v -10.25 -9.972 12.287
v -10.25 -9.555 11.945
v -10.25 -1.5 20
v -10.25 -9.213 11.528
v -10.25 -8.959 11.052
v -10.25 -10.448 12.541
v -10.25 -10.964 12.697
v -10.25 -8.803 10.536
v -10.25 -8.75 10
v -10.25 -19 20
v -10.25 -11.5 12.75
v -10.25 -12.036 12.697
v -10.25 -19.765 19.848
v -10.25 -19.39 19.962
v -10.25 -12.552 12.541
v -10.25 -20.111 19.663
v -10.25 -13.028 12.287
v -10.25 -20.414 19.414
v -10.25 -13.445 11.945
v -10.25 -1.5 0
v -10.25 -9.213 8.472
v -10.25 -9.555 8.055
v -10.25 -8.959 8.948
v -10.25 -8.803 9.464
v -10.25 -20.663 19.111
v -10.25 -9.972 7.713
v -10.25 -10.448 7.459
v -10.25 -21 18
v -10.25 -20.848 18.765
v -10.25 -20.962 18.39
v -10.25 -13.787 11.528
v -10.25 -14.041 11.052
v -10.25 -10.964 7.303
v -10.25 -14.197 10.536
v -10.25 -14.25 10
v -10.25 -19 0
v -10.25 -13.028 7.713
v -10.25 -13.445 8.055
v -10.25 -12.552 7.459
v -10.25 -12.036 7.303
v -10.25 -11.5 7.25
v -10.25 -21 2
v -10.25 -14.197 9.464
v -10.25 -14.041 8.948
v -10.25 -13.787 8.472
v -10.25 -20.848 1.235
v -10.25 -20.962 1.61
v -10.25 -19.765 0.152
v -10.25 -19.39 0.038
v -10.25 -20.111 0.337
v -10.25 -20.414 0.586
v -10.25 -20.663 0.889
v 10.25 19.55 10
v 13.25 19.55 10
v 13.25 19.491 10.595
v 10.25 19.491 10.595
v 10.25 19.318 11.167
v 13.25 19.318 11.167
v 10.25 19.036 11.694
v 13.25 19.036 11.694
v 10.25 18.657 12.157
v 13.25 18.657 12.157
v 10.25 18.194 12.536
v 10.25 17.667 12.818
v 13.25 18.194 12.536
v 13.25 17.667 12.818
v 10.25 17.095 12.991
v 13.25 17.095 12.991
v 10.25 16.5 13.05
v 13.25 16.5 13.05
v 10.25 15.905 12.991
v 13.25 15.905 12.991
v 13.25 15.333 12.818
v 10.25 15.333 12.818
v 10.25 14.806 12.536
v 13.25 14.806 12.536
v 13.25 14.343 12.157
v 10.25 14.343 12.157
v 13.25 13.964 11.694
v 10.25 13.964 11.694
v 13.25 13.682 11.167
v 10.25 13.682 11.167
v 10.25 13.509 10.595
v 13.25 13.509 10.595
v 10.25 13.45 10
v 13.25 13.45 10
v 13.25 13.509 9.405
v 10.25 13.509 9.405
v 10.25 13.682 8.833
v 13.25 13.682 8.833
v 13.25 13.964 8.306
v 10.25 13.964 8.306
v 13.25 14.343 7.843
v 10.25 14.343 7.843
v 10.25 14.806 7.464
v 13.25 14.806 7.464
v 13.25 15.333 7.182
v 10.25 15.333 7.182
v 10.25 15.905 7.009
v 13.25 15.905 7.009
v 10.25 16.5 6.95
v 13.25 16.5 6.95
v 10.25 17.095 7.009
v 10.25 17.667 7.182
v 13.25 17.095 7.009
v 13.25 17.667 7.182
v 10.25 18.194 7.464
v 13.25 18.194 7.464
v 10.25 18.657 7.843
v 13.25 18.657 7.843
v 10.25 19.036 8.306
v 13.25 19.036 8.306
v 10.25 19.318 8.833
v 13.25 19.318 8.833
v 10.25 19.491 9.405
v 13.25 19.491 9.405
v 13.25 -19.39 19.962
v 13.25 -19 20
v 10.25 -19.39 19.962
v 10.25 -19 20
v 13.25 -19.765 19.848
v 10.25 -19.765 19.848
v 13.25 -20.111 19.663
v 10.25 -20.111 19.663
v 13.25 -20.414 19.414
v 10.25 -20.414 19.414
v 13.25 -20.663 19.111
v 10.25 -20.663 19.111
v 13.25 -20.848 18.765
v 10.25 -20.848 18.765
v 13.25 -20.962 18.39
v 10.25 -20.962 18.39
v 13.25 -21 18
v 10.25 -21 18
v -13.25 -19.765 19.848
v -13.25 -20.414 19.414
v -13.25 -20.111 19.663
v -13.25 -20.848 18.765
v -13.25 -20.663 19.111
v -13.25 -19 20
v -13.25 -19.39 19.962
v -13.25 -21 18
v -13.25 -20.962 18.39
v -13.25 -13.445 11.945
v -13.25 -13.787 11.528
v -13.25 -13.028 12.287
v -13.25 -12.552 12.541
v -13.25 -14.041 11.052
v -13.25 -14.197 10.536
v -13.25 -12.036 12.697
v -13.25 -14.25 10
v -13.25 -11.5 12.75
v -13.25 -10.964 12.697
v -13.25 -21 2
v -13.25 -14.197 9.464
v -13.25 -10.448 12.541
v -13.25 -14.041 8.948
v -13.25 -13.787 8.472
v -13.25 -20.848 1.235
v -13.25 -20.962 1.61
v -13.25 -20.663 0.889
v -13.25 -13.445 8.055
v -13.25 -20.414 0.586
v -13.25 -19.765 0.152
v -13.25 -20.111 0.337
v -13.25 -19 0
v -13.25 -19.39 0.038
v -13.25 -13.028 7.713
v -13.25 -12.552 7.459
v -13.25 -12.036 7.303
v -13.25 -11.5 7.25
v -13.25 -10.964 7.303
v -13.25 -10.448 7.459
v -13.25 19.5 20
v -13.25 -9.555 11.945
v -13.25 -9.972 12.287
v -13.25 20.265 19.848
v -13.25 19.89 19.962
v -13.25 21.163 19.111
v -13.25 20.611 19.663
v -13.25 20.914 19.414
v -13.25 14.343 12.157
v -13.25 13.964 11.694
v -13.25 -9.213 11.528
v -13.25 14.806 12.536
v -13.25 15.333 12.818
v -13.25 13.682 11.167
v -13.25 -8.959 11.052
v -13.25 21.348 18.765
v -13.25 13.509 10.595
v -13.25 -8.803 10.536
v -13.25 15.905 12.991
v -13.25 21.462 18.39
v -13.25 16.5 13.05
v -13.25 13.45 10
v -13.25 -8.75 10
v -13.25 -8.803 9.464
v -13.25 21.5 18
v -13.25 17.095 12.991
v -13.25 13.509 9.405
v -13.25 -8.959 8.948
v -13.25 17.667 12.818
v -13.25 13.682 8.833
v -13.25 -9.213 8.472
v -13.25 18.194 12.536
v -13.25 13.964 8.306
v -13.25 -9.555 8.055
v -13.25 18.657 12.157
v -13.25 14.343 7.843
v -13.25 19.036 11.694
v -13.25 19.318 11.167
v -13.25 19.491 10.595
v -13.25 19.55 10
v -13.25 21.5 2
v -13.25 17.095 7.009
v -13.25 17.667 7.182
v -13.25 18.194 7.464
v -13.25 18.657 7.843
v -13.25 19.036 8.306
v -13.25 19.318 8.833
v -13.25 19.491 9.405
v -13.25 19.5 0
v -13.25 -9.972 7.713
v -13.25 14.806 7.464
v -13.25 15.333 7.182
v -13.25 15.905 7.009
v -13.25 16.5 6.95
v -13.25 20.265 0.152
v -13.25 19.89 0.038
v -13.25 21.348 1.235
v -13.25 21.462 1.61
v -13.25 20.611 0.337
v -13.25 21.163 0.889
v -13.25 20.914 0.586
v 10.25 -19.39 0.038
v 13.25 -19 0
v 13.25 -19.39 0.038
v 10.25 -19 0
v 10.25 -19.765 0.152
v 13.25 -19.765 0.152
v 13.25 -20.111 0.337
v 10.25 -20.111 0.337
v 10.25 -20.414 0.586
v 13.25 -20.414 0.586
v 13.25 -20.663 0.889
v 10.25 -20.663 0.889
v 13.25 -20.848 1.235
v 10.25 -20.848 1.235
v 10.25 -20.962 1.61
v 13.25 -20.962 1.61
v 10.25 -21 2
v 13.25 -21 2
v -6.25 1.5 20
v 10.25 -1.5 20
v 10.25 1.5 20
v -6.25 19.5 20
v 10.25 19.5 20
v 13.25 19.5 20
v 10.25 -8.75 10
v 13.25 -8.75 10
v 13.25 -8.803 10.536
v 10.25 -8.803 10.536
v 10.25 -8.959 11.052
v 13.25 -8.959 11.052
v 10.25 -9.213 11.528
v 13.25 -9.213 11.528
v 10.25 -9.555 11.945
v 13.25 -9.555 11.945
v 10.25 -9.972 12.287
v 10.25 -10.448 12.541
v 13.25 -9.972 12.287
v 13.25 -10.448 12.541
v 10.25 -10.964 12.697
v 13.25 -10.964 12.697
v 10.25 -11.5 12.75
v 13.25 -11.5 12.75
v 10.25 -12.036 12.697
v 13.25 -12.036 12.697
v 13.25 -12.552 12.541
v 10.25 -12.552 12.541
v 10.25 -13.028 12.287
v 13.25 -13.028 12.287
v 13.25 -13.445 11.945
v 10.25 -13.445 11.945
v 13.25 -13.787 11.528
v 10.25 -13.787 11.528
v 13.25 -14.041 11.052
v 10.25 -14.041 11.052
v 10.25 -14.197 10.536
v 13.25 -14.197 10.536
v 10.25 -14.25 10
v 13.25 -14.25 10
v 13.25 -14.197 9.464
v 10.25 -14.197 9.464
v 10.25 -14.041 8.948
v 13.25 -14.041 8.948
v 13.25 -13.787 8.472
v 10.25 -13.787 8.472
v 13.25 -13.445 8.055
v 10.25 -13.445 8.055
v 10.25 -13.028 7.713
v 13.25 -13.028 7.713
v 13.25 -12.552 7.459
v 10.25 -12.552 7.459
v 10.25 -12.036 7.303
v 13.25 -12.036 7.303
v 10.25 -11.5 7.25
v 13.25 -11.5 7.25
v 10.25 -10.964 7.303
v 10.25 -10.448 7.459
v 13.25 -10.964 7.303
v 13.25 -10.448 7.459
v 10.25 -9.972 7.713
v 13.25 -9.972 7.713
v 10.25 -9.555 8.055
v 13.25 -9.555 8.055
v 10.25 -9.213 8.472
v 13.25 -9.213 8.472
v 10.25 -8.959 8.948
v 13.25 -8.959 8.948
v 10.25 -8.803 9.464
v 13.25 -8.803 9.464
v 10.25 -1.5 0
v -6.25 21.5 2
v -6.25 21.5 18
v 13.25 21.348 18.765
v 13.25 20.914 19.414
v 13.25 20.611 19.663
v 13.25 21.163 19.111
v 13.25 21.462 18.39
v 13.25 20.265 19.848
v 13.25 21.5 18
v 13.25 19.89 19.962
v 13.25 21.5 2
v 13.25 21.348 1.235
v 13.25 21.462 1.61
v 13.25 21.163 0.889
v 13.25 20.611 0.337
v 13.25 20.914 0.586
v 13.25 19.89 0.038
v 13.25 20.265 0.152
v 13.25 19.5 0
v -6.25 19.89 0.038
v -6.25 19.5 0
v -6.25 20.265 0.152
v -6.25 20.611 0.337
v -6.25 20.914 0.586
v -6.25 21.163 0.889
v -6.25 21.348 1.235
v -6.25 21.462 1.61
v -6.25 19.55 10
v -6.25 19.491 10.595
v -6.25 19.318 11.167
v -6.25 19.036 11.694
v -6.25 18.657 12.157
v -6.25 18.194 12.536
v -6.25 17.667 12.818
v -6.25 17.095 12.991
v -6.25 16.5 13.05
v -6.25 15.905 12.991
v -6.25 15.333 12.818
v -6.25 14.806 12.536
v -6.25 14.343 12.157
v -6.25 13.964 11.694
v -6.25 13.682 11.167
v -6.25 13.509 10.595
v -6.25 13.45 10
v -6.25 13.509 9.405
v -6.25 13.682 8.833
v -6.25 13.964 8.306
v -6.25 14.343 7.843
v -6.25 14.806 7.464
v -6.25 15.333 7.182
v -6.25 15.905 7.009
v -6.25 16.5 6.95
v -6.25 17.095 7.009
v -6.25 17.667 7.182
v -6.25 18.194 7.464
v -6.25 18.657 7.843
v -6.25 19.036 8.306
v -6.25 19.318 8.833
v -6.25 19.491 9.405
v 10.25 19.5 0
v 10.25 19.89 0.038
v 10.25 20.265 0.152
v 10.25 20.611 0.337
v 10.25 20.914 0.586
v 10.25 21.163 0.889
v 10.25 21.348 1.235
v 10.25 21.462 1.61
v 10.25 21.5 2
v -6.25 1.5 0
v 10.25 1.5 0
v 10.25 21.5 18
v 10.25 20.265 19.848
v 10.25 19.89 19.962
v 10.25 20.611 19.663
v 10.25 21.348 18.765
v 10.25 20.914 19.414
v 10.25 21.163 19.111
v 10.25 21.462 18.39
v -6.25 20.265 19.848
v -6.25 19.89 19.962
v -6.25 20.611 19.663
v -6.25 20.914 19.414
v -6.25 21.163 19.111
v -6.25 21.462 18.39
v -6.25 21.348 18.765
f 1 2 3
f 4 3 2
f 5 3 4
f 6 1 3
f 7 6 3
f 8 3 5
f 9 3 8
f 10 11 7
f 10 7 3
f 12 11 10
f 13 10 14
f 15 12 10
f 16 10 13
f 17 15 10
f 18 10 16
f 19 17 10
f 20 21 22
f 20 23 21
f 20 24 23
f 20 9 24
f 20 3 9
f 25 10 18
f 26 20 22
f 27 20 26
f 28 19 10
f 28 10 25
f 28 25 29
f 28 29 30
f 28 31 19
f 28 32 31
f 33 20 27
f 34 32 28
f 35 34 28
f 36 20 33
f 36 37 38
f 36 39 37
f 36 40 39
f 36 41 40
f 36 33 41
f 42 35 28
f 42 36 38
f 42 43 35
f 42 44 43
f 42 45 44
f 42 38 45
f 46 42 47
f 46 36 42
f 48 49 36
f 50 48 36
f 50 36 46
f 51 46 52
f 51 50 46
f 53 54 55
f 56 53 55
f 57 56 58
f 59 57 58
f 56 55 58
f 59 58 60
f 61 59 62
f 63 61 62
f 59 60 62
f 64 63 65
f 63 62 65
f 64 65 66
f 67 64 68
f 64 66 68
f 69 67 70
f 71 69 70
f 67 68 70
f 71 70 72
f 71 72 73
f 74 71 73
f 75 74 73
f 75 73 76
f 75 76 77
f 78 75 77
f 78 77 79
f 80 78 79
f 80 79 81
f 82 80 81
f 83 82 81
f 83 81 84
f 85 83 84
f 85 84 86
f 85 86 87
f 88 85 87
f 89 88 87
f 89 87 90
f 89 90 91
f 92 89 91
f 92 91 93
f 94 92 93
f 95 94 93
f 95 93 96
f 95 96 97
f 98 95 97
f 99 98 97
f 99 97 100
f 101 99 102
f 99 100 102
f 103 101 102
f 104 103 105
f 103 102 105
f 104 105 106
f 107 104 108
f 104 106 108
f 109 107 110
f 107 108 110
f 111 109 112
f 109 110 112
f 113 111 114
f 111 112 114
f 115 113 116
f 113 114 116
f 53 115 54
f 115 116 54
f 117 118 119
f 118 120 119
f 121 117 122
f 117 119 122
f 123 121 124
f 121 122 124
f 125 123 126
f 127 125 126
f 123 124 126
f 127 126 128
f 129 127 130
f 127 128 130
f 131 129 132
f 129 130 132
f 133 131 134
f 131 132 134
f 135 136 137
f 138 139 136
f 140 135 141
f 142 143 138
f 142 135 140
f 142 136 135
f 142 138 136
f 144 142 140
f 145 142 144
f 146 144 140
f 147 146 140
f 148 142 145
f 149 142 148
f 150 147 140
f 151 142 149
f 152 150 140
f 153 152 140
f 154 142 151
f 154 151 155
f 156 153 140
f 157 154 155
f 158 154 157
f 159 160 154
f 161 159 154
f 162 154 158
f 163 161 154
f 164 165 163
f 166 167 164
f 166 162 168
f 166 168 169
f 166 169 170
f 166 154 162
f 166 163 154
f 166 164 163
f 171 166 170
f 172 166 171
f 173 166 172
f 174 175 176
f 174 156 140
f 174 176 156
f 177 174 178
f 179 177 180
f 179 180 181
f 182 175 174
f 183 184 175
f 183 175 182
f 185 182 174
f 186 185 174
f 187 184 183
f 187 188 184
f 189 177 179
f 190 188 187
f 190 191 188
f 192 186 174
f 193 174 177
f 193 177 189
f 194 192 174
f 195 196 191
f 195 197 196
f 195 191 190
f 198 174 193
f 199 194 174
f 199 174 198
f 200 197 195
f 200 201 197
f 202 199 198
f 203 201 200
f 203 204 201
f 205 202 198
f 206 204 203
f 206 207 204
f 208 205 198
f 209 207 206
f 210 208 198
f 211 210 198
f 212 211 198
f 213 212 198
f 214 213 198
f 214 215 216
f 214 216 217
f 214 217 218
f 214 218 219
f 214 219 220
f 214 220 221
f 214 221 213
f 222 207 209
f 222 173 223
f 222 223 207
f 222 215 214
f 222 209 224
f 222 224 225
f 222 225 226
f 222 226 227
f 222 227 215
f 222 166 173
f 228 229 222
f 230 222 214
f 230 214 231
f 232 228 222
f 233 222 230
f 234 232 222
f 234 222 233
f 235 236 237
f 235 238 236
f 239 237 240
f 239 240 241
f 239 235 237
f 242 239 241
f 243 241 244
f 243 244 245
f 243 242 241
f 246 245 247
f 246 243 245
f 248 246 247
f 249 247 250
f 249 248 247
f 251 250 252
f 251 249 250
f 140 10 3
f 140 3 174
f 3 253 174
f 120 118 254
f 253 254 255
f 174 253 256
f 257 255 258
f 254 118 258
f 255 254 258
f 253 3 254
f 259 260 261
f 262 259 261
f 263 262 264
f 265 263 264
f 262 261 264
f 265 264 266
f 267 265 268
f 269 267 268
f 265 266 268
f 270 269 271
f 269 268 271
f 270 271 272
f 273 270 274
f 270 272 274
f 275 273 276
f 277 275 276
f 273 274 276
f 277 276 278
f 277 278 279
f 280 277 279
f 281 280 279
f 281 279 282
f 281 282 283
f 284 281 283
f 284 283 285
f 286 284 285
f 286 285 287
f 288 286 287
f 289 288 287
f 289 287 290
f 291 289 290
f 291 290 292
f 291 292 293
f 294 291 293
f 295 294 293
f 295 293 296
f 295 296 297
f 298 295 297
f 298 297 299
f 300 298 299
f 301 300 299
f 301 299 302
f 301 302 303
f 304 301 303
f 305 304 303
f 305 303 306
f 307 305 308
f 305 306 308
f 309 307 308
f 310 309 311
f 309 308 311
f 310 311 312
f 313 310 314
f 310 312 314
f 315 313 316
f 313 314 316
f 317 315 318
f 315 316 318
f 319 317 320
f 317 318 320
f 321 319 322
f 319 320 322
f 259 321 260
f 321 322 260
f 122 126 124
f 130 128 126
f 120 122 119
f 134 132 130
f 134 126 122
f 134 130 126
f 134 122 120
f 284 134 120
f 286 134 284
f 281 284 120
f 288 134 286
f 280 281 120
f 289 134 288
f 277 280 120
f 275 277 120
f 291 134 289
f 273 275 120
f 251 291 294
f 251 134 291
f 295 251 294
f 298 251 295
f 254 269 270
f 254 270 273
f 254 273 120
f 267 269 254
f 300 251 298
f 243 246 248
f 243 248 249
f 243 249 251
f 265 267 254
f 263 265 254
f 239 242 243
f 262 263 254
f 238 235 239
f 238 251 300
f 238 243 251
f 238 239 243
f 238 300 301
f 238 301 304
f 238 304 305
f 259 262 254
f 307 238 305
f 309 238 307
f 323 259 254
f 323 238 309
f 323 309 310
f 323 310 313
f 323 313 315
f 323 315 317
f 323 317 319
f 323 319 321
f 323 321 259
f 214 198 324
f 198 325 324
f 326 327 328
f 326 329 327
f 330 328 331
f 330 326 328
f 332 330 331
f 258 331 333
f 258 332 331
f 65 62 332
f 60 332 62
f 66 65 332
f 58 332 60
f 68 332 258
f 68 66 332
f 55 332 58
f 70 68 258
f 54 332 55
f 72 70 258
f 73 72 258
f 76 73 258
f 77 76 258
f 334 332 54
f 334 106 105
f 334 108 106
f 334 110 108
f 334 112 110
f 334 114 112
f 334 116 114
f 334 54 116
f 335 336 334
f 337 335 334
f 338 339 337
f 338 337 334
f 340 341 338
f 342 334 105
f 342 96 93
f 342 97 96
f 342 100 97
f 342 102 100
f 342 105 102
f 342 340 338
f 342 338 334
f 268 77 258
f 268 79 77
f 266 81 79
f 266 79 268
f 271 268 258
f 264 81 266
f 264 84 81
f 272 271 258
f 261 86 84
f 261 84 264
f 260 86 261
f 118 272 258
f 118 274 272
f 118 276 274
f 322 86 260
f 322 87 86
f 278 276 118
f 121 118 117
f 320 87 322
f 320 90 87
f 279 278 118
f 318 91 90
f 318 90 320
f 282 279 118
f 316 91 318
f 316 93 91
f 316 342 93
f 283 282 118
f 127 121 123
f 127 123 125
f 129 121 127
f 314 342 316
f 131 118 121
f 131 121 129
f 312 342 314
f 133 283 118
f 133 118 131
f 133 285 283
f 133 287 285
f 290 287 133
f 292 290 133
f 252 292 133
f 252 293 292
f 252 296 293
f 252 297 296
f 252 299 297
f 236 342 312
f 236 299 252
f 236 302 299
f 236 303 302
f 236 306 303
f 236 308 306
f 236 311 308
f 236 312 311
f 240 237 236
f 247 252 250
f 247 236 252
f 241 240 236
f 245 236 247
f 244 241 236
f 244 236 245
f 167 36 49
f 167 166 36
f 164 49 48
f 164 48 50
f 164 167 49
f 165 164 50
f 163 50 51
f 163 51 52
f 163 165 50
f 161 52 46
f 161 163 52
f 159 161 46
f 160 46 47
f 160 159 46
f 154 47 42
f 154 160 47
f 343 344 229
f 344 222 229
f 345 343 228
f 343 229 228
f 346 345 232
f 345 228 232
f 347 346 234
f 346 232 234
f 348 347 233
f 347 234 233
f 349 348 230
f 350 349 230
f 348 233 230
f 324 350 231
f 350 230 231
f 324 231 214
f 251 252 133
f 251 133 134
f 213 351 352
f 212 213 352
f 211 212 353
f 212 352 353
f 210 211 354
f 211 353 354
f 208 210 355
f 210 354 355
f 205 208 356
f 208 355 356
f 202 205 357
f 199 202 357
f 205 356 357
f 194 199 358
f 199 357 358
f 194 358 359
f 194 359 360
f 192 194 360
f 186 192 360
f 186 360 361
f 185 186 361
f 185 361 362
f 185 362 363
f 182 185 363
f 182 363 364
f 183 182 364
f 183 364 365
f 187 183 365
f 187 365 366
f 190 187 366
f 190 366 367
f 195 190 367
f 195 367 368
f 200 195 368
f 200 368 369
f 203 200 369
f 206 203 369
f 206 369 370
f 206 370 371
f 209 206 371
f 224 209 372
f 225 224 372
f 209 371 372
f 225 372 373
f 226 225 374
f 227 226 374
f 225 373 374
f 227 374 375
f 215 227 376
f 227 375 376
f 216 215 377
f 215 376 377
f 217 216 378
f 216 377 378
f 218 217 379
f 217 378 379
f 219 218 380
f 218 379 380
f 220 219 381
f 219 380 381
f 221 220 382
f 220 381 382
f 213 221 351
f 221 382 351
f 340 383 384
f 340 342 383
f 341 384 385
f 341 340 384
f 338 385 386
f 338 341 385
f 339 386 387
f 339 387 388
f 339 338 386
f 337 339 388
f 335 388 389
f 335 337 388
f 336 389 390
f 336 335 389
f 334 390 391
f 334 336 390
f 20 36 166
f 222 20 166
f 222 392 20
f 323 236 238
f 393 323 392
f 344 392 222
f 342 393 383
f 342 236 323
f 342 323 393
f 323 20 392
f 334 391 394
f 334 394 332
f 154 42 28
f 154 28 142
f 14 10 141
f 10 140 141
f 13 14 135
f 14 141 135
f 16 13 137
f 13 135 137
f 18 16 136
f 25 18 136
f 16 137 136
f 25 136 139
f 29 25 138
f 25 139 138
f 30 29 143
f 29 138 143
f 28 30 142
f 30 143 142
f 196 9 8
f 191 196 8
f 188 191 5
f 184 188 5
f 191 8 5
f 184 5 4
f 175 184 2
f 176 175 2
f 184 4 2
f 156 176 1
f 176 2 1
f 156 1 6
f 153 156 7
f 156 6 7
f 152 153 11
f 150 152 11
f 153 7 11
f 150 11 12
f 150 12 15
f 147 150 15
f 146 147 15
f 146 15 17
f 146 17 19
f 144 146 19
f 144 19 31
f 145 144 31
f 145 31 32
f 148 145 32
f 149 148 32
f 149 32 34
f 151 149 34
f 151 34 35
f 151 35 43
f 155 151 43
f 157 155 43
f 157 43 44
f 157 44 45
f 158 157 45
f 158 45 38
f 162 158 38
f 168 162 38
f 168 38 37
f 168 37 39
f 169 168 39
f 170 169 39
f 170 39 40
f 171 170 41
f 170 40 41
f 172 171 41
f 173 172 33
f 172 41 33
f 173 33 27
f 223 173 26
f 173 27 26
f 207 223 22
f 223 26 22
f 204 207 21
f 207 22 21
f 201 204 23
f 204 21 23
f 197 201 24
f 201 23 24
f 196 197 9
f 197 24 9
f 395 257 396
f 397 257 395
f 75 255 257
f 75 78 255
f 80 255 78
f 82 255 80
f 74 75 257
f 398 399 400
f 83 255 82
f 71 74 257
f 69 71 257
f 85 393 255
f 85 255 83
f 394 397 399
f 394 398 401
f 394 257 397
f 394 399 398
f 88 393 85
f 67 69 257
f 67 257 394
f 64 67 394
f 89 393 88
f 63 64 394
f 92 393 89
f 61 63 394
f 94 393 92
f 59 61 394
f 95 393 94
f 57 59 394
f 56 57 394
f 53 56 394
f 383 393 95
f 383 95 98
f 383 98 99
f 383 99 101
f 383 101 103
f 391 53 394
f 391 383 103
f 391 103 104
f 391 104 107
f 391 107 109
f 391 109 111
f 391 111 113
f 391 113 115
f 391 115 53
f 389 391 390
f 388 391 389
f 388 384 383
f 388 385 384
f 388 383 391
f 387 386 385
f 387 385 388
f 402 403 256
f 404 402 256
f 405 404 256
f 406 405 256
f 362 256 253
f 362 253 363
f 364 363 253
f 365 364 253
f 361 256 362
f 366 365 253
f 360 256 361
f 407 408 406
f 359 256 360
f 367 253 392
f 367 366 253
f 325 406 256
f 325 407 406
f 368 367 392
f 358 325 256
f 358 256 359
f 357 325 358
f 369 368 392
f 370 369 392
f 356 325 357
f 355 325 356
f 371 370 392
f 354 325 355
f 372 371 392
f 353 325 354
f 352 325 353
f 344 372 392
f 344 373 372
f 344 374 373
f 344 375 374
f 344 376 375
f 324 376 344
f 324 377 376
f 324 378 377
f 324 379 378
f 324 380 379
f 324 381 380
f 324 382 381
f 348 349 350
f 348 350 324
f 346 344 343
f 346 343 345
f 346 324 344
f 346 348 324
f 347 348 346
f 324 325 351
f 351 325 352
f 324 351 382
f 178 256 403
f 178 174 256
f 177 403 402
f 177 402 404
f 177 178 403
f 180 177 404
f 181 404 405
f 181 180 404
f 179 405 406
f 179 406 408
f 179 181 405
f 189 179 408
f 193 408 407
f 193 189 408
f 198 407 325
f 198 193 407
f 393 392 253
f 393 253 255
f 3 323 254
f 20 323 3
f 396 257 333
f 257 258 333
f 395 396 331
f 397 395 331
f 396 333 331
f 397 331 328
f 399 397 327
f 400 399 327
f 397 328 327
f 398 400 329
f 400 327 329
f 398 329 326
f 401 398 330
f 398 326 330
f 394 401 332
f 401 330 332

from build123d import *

# Parameters (mm, degrees)
BOSS_EXTRUDE1_DEPTH = 20
SKETCH2_R           = 2.75
SKETCH2_R_2         = 3.05
CUT_EXTRUDE1_DEPTH  = 40.553760883
BOSS_EXTRUDE2_START = 4
SKETCH3_W           = 20
SKETCH3_H           = 20
SKETCH3_R           = 3.05
BOSS_EXTRUDE2_DEPTH = 4
FILLET1_R           = 2


with BuildPart() as part:
    # Sketch1 → Boss-Extrude1 (new body)
    with BuildSketch(Plane.XY):
        Polygon((-10.25, 1.5), (10.25, 1.5), (10.25, 21.5), (13.25, 21.5), (13.25, -21), (10.25, -21), (10.25, -1.5), (-10.25, -1.5), (-10.25, -21), (-13.25, -21), (-13.25, 21.5), (-10.25, 21.5), align=None)
    extrude(amount=BOSS_EXTRUDE1_DEPTH)

    # Sketch2 → Cut-Extrude1 (cut, through all)
    with BuildSketch(Plane(origin=(13.25, 0, 0), x_dir=(0, 0, -1), z_dir=(1, 0, 0))):
        with Locations(Location((-10, -11.5, 0), (0, 0, 90))):
            Circle(SKETCH2_R)
        with Locations(Location((-10, 16.5, 0), (0, 0, 90))):
            Circle(SKETCH2_R_2)
    extrude(amount=-CUT_EXTRUDE1_DEPTH, mode=Mode.SUBTRACT)

    # Sketch3 → Boss-Extrude2 (add)
    with BuildSketch(Plane(origin=(-10.25, 0, 0), x_dir=(0, 0, -1), z_dir=(1, 0, 0)).offset(BOSS_EXTRUDE2_START)):
        with Locations((-10, 11.5)):
            Rectangle(SKETCH3_W, SKETCH3_H)
        with Locations(Location((-10, 16.5, 0), (0, 0, 90))):
            Circle(SKETCH3_R, mode=Mode.SUBTRACT)
    extrude(amount=-BOSS_EXTRUDE2_DEPTH)

    # Fillet1
    fillet1_edges = [part.edges().sort_by_distance(p)[0] for p in [
        (-9.75, 21.5, 0),
        (11.75, 21.5, 0),
        (11.75, -21, 0),
        (-11.75, -21, 0),
        (11.75, -21, 20),
        (11.75, 21.5, 20),
        (-9.75, 21.5, 20),
        (-11.75, -21, 20),
    ]]
    fillet(fillet1_edges, radius=FILLET1_R)


solid = part.part
